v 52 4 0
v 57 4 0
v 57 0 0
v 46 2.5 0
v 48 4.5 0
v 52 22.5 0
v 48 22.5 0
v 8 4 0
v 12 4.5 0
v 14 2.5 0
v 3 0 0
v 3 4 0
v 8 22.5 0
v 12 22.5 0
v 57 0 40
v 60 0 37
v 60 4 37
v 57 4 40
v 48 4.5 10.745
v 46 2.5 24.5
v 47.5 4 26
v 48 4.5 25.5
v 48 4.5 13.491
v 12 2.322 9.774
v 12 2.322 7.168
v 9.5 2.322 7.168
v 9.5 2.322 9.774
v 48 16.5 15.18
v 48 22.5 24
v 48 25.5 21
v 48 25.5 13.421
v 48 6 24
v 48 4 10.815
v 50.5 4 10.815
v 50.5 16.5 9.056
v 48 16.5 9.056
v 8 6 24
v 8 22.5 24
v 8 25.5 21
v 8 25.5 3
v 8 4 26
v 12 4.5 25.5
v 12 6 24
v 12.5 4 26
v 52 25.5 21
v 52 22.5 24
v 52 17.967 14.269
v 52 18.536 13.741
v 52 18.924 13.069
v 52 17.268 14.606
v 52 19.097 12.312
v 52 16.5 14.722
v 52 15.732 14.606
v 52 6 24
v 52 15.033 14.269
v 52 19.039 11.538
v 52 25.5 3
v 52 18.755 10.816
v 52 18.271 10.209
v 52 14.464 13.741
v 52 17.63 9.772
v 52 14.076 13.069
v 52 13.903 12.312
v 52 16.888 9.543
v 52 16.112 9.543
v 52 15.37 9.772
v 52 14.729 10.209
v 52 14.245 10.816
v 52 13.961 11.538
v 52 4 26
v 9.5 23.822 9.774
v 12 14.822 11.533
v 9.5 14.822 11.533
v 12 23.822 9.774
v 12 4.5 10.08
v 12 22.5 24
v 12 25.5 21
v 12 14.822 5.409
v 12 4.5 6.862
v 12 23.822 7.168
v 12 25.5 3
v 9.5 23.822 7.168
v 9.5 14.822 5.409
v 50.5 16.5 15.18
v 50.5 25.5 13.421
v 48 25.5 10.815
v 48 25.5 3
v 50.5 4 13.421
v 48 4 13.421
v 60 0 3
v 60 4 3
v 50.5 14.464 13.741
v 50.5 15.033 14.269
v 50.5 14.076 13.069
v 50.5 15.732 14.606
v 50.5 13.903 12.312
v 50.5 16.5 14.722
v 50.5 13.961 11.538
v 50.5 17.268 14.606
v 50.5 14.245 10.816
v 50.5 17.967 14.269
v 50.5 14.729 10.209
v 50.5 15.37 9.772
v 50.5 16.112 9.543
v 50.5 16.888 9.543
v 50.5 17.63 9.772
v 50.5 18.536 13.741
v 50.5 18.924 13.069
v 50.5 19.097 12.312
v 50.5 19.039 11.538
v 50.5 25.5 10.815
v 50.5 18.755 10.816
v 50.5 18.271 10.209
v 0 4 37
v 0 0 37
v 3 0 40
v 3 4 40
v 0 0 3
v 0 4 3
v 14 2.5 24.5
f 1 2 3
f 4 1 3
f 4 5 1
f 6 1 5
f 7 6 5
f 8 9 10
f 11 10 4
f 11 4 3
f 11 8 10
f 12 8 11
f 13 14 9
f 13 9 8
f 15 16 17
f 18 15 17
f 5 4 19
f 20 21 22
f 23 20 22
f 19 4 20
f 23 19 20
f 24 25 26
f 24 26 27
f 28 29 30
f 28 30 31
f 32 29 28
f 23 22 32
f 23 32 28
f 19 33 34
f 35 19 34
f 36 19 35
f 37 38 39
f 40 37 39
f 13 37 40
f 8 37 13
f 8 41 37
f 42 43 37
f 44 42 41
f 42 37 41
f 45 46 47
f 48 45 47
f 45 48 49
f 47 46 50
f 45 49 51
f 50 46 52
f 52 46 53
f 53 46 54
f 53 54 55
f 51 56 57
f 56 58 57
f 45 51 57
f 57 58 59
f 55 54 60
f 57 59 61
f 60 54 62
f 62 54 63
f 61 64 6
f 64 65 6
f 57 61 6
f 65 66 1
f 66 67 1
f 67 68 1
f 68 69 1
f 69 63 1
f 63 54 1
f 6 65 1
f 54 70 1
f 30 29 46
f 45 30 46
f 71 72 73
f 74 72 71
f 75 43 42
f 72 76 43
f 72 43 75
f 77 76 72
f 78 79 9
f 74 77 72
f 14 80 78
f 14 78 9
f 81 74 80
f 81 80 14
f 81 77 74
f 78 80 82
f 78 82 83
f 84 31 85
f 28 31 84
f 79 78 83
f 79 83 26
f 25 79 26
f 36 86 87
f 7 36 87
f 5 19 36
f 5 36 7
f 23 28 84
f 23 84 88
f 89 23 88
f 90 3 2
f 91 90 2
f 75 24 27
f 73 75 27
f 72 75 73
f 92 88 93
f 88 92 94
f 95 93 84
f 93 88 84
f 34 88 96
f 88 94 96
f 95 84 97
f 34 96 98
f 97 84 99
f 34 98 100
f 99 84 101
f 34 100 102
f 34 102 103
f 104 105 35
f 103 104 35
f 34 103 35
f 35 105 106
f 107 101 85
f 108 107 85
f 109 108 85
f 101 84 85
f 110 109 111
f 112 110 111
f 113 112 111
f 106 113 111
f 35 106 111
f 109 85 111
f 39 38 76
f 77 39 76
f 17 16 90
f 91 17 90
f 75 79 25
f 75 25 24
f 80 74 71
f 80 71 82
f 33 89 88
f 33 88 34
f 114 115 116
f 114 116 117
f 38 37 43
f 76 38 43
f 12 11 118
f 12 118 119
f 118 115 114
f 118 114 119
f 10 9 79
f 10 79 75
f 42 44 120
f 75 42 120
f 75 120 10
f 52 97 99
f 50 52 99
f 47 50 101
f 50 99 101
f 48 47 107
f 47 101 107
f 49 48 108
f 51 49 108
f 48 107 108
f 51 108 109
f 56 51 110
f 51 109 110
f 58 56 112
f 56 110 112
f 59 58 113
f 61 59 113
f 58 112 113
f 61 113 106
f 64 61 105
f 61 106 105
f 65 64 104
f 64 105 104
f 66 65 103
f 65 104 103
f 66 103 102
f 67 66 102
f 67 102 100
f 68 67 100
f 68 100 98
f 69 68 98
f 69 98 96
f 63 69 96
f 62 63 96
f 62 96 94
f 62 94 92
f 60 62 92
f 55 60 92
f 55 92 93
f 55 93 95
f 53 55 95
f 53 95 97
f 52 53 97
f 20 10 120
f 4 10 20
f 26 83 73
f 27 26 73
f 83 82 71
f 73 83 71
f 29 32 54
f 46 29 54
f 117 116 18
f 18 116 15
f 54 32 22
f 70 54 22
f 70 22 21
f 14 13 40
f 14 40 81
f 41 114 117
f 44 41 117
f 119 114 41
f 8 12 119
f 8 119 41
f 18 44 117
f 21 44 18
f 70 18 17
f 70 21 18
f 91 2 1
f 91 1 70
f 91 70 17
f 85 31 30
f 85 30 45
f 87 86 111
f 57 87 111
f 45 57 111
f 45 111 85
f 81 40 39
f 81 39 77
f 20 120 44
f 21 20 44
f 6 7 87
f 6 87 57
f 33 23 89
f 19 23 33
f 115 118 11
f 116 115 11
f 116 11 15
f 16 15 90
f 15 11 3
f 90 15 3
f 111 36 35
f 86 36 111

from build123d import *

# Parameters (mm, degrees)
SKETCH1_W           = 60
SKETCH1_H           = 40
BOSS_EXTRUDE1_DEPTH = 4
CHAMFER1_SIZE       = 3
SKETCH2_W           = 36
SKETCH2_H           = 24
CUT_EXTRUDE1_DEPTH  = 1.5
SKETCH3_W           = 4
SKETCH3_H           = 24
BOSS_EXTRUDE2_DEPTH = 23
CHAMFER2_SIZE       = 3
CHAMFER3_SIZE       = 2
CHAMFER4_SIZE       = 2
CHAMFER5_SIZE       = 2
CUT_EXTRUDE2_DEPTH  = 2.5
SKETCH7_R           = 2.604037506
CUT_EXTRUDE3_DEPTH  = 70.285640648
CUT_EXTRUDE4_DEPTH  = 2.5


with BuildPart() as part:
    # Sketch1 → Boss-Extrude1 (new body)
    with BuildSketch(Plane(origin=(0, 0, 0), x_dir=(1, 0, 0), z_dir=(0, 1, 0))):
        with Locations((30, -20)):
            Rectangle(SKETCH1_W, SKETCH1_H)
    extrude(amount=BOSS_EXTRUDE1_DEPTH)

    # Chamfer1
    chamfer1_edges = [part.edges().sort_by_distance(p)[0] for p in [
        (0, 2, 0),
        (60, 2, 0),
        (60, 2, 40),
        (0, 2, 40),
    ]]
    chamfer(chamfer1_edges, length=CHAMFER1_SIZE)

    # Sketch2 → Cut-Extrude1 (cut)
    with BuildSketch(Plane(origin=(0, 4, 0), x_dir=(1, 0, 0), z_dir=(0, 1, 0))):
        with Locations((30, -12)):
            Rectangle(SKETCH2_W, SKETCH2_H)
    extrude(amount=-CUT_EXTRUDE1_DEPTH, mode=Mode.SUBTRACT)

    # Sketch3 → Boss-Extrude2 (add)
    with BuildSketch(Plane(origin=(0, 2.5, 0), x_dir=(1, 0, 0), z_dir=(0, 1, 0))):
        with Locations((50, -12)):
            Rectangle(SKETCH3_W, SKETCH3_H)
        with Locations((10, -12)):
            Rectangle(SKETCH3_W, SKETCH3_H)
    extrude(amount=BOSS_EXTRUDE2_DEPTH)

    # Chamfer2
    chamfer2_edges = [part.edges().sort_by_distance(p)[0] for p in [
        (50, 25.5, 24),
        (50, 25.5, 0),
        (10, 25.5, 0),
        (10, 25.5, 24),
    ]]
    chamfer(chamfer2_edges, length=CHAMFER2_SIZE)

    # Chamfer3
    chamfer3_edges = [part.edges().sort_by_distance(p)[0] for p in [
        (50, 4, 24),
        (10, 4, 24),
    ]]
    chamfer(chamfer3_edges, length=CHAMFER3_SIZE)

    # Chamfer4
    # the kernel refuses this chamfer: 2 mm, written as the material it takes off along each edge
    with BuildSketch(Plane(origin=(48, 4, 24), x_dir=(0, -0.9996219169112968, -0.027495876610585623), z_dir=(-1, 0, 0))) as chamfer4_piece_1_section:
        Polygon((CHAMFER4_SIZE * 0.999621916911, CHAMFER4_SIZE * 0.0274958766106), (-CHAMFER4_SIZE * 0.0274958766106, CHAMFER4_SIZE * 0.999621916911), (0, 0), align=None)
    chamfer4_piece_1 = extrude(amount=36, mode=Mode.PRIVATE)
    chamfer4_piece_1 = split(chamfer4_piece_1, bisect_by=Plane(origin=(30, 2.5, 24.699033576), z_dir=(0, 1, 0)), keep=Keep.TOP, mode=Mode.PRIVATE)
    chamfer4_piece_1 = split(chamfer4_piece_1, bisect_by=Plane(origin=(30, 4.361799404, 25.638200596), z_dir=(0, -0.7071067811865476, -0.7071067811865476)), keep=Keep.TOP, mode=Mode.PRIVATE)
    add(chamfer4_piece_1, mode=Mode.SUBTRACT)

    # Chamfer5
    # the kernel refuses this chamfer: 2 mm, written as the material it adds along each edge
    with BuildSketch(Plane(origin=(12, 2.5, 29.643365976), x_dir=(-0.027495876610586487, 0.9996219169112968, 0), z_dir=(0, 0, -1))) as chamfer5_piece_1_section:
        Polygon((CHAMFER5_SIZE * 0.999621916911, CHAMFER5_SIZE * 0.0274958766106), (-CHAMFER5_SIZE * 0.0274958766106, CHAMFER5_SIZE * 0.999621916911), (0, 0), align=None)
    chamfer5_piece_1 = extrude(amount=29.643365976, mode=Mode.PRIVATE)
    chamfer5_piece_1 = split(chamfer5_piece_1, bisect_by=Plane(origin=(12.696713147, 10.276643426, 19.723356574), z_dir=(0, -0.7071067811865476, -0.7071067811865476)), keep=Keep.TOP, mode=Mode.PRIVATE)
    add(chamfer5_piece_1)
    with BuildSketch(Plane(origin=(48, 2.5, 29.643365976), x_dir=(-0.9996219169112968, -0.027495876610586296, 0), z_dir=(0, 0, -1))) as chamfer5_piece_2_section:
        Polygon((CHAMFER5_SIZE * 0.999621916911, CHAMFER5_SIZE * 0.0274958766106), (-CHAMFER5_SIZE * 0.0274958766106, CHAMFER5_SIZE * 0.999621916911), (0, 0), align=None)
    chamfer5_piece_2 = extrude(amount=29.643365976, mode=Mode.PRIVATE)
    chamfer5_piece_2 = split(chamfer5_piece_2, bisect_by=Plane(origin=(47.833064516, 10.624596774, 19.375403226), z_dir=(0, -0.7071067811865476, -0.7071067811865476)), keep=Keep.TOP, mode=Mode.PRIVATE)
    add(chamfer5_piece_2)

    # Sketch4 → Cut-Extrude2 (cut)
    with BuildSketch(Plane.ZY.offset(-48)):
        Polygon((9.05620064, 16.5), (10.815025537, 25.5), (13.420692052, 25.5), (15.179516949, 16.5), (13.420692052, 4), (10.815025537, 4), align=None)
    extrude(amount=-CUT_EXTRUDE2_DEPTH, mode=Mode.SUBTRACT)

    # Sketch7 → Cut-Extrude3 (cut, through all)
    with BuildSketch(Plane.ZY.offset(-50.5)):
        with Locations((12.117858795, 16.5)):
            Circle(SKETCH7_R)
    extrude(amount=-CUT_EXTRUDE3_DEPTH, mode=Mode.SUBTRACT)

    # Sketch8 → Cut-Extrude4 (cut)
    with BuildSketch(Plane(origin=(12, 0, 0), x_dir=(0, 0, -1), z_dir=(1, 0, 0))):
        Polygon((-11.53257408, 14.821897089), (-9.773749183, 23.821897089), (-7.168082669, 23.821897089), (-5.409257772, 14.821897089), (-7.168082669, 2.321897089), (-9.773749183, 2.321897089), align=None)
    extrude(amount=-CUT_EXTRUDE4_DEPTH, mode=Mode.SUBTRACT)


solid = part.part
